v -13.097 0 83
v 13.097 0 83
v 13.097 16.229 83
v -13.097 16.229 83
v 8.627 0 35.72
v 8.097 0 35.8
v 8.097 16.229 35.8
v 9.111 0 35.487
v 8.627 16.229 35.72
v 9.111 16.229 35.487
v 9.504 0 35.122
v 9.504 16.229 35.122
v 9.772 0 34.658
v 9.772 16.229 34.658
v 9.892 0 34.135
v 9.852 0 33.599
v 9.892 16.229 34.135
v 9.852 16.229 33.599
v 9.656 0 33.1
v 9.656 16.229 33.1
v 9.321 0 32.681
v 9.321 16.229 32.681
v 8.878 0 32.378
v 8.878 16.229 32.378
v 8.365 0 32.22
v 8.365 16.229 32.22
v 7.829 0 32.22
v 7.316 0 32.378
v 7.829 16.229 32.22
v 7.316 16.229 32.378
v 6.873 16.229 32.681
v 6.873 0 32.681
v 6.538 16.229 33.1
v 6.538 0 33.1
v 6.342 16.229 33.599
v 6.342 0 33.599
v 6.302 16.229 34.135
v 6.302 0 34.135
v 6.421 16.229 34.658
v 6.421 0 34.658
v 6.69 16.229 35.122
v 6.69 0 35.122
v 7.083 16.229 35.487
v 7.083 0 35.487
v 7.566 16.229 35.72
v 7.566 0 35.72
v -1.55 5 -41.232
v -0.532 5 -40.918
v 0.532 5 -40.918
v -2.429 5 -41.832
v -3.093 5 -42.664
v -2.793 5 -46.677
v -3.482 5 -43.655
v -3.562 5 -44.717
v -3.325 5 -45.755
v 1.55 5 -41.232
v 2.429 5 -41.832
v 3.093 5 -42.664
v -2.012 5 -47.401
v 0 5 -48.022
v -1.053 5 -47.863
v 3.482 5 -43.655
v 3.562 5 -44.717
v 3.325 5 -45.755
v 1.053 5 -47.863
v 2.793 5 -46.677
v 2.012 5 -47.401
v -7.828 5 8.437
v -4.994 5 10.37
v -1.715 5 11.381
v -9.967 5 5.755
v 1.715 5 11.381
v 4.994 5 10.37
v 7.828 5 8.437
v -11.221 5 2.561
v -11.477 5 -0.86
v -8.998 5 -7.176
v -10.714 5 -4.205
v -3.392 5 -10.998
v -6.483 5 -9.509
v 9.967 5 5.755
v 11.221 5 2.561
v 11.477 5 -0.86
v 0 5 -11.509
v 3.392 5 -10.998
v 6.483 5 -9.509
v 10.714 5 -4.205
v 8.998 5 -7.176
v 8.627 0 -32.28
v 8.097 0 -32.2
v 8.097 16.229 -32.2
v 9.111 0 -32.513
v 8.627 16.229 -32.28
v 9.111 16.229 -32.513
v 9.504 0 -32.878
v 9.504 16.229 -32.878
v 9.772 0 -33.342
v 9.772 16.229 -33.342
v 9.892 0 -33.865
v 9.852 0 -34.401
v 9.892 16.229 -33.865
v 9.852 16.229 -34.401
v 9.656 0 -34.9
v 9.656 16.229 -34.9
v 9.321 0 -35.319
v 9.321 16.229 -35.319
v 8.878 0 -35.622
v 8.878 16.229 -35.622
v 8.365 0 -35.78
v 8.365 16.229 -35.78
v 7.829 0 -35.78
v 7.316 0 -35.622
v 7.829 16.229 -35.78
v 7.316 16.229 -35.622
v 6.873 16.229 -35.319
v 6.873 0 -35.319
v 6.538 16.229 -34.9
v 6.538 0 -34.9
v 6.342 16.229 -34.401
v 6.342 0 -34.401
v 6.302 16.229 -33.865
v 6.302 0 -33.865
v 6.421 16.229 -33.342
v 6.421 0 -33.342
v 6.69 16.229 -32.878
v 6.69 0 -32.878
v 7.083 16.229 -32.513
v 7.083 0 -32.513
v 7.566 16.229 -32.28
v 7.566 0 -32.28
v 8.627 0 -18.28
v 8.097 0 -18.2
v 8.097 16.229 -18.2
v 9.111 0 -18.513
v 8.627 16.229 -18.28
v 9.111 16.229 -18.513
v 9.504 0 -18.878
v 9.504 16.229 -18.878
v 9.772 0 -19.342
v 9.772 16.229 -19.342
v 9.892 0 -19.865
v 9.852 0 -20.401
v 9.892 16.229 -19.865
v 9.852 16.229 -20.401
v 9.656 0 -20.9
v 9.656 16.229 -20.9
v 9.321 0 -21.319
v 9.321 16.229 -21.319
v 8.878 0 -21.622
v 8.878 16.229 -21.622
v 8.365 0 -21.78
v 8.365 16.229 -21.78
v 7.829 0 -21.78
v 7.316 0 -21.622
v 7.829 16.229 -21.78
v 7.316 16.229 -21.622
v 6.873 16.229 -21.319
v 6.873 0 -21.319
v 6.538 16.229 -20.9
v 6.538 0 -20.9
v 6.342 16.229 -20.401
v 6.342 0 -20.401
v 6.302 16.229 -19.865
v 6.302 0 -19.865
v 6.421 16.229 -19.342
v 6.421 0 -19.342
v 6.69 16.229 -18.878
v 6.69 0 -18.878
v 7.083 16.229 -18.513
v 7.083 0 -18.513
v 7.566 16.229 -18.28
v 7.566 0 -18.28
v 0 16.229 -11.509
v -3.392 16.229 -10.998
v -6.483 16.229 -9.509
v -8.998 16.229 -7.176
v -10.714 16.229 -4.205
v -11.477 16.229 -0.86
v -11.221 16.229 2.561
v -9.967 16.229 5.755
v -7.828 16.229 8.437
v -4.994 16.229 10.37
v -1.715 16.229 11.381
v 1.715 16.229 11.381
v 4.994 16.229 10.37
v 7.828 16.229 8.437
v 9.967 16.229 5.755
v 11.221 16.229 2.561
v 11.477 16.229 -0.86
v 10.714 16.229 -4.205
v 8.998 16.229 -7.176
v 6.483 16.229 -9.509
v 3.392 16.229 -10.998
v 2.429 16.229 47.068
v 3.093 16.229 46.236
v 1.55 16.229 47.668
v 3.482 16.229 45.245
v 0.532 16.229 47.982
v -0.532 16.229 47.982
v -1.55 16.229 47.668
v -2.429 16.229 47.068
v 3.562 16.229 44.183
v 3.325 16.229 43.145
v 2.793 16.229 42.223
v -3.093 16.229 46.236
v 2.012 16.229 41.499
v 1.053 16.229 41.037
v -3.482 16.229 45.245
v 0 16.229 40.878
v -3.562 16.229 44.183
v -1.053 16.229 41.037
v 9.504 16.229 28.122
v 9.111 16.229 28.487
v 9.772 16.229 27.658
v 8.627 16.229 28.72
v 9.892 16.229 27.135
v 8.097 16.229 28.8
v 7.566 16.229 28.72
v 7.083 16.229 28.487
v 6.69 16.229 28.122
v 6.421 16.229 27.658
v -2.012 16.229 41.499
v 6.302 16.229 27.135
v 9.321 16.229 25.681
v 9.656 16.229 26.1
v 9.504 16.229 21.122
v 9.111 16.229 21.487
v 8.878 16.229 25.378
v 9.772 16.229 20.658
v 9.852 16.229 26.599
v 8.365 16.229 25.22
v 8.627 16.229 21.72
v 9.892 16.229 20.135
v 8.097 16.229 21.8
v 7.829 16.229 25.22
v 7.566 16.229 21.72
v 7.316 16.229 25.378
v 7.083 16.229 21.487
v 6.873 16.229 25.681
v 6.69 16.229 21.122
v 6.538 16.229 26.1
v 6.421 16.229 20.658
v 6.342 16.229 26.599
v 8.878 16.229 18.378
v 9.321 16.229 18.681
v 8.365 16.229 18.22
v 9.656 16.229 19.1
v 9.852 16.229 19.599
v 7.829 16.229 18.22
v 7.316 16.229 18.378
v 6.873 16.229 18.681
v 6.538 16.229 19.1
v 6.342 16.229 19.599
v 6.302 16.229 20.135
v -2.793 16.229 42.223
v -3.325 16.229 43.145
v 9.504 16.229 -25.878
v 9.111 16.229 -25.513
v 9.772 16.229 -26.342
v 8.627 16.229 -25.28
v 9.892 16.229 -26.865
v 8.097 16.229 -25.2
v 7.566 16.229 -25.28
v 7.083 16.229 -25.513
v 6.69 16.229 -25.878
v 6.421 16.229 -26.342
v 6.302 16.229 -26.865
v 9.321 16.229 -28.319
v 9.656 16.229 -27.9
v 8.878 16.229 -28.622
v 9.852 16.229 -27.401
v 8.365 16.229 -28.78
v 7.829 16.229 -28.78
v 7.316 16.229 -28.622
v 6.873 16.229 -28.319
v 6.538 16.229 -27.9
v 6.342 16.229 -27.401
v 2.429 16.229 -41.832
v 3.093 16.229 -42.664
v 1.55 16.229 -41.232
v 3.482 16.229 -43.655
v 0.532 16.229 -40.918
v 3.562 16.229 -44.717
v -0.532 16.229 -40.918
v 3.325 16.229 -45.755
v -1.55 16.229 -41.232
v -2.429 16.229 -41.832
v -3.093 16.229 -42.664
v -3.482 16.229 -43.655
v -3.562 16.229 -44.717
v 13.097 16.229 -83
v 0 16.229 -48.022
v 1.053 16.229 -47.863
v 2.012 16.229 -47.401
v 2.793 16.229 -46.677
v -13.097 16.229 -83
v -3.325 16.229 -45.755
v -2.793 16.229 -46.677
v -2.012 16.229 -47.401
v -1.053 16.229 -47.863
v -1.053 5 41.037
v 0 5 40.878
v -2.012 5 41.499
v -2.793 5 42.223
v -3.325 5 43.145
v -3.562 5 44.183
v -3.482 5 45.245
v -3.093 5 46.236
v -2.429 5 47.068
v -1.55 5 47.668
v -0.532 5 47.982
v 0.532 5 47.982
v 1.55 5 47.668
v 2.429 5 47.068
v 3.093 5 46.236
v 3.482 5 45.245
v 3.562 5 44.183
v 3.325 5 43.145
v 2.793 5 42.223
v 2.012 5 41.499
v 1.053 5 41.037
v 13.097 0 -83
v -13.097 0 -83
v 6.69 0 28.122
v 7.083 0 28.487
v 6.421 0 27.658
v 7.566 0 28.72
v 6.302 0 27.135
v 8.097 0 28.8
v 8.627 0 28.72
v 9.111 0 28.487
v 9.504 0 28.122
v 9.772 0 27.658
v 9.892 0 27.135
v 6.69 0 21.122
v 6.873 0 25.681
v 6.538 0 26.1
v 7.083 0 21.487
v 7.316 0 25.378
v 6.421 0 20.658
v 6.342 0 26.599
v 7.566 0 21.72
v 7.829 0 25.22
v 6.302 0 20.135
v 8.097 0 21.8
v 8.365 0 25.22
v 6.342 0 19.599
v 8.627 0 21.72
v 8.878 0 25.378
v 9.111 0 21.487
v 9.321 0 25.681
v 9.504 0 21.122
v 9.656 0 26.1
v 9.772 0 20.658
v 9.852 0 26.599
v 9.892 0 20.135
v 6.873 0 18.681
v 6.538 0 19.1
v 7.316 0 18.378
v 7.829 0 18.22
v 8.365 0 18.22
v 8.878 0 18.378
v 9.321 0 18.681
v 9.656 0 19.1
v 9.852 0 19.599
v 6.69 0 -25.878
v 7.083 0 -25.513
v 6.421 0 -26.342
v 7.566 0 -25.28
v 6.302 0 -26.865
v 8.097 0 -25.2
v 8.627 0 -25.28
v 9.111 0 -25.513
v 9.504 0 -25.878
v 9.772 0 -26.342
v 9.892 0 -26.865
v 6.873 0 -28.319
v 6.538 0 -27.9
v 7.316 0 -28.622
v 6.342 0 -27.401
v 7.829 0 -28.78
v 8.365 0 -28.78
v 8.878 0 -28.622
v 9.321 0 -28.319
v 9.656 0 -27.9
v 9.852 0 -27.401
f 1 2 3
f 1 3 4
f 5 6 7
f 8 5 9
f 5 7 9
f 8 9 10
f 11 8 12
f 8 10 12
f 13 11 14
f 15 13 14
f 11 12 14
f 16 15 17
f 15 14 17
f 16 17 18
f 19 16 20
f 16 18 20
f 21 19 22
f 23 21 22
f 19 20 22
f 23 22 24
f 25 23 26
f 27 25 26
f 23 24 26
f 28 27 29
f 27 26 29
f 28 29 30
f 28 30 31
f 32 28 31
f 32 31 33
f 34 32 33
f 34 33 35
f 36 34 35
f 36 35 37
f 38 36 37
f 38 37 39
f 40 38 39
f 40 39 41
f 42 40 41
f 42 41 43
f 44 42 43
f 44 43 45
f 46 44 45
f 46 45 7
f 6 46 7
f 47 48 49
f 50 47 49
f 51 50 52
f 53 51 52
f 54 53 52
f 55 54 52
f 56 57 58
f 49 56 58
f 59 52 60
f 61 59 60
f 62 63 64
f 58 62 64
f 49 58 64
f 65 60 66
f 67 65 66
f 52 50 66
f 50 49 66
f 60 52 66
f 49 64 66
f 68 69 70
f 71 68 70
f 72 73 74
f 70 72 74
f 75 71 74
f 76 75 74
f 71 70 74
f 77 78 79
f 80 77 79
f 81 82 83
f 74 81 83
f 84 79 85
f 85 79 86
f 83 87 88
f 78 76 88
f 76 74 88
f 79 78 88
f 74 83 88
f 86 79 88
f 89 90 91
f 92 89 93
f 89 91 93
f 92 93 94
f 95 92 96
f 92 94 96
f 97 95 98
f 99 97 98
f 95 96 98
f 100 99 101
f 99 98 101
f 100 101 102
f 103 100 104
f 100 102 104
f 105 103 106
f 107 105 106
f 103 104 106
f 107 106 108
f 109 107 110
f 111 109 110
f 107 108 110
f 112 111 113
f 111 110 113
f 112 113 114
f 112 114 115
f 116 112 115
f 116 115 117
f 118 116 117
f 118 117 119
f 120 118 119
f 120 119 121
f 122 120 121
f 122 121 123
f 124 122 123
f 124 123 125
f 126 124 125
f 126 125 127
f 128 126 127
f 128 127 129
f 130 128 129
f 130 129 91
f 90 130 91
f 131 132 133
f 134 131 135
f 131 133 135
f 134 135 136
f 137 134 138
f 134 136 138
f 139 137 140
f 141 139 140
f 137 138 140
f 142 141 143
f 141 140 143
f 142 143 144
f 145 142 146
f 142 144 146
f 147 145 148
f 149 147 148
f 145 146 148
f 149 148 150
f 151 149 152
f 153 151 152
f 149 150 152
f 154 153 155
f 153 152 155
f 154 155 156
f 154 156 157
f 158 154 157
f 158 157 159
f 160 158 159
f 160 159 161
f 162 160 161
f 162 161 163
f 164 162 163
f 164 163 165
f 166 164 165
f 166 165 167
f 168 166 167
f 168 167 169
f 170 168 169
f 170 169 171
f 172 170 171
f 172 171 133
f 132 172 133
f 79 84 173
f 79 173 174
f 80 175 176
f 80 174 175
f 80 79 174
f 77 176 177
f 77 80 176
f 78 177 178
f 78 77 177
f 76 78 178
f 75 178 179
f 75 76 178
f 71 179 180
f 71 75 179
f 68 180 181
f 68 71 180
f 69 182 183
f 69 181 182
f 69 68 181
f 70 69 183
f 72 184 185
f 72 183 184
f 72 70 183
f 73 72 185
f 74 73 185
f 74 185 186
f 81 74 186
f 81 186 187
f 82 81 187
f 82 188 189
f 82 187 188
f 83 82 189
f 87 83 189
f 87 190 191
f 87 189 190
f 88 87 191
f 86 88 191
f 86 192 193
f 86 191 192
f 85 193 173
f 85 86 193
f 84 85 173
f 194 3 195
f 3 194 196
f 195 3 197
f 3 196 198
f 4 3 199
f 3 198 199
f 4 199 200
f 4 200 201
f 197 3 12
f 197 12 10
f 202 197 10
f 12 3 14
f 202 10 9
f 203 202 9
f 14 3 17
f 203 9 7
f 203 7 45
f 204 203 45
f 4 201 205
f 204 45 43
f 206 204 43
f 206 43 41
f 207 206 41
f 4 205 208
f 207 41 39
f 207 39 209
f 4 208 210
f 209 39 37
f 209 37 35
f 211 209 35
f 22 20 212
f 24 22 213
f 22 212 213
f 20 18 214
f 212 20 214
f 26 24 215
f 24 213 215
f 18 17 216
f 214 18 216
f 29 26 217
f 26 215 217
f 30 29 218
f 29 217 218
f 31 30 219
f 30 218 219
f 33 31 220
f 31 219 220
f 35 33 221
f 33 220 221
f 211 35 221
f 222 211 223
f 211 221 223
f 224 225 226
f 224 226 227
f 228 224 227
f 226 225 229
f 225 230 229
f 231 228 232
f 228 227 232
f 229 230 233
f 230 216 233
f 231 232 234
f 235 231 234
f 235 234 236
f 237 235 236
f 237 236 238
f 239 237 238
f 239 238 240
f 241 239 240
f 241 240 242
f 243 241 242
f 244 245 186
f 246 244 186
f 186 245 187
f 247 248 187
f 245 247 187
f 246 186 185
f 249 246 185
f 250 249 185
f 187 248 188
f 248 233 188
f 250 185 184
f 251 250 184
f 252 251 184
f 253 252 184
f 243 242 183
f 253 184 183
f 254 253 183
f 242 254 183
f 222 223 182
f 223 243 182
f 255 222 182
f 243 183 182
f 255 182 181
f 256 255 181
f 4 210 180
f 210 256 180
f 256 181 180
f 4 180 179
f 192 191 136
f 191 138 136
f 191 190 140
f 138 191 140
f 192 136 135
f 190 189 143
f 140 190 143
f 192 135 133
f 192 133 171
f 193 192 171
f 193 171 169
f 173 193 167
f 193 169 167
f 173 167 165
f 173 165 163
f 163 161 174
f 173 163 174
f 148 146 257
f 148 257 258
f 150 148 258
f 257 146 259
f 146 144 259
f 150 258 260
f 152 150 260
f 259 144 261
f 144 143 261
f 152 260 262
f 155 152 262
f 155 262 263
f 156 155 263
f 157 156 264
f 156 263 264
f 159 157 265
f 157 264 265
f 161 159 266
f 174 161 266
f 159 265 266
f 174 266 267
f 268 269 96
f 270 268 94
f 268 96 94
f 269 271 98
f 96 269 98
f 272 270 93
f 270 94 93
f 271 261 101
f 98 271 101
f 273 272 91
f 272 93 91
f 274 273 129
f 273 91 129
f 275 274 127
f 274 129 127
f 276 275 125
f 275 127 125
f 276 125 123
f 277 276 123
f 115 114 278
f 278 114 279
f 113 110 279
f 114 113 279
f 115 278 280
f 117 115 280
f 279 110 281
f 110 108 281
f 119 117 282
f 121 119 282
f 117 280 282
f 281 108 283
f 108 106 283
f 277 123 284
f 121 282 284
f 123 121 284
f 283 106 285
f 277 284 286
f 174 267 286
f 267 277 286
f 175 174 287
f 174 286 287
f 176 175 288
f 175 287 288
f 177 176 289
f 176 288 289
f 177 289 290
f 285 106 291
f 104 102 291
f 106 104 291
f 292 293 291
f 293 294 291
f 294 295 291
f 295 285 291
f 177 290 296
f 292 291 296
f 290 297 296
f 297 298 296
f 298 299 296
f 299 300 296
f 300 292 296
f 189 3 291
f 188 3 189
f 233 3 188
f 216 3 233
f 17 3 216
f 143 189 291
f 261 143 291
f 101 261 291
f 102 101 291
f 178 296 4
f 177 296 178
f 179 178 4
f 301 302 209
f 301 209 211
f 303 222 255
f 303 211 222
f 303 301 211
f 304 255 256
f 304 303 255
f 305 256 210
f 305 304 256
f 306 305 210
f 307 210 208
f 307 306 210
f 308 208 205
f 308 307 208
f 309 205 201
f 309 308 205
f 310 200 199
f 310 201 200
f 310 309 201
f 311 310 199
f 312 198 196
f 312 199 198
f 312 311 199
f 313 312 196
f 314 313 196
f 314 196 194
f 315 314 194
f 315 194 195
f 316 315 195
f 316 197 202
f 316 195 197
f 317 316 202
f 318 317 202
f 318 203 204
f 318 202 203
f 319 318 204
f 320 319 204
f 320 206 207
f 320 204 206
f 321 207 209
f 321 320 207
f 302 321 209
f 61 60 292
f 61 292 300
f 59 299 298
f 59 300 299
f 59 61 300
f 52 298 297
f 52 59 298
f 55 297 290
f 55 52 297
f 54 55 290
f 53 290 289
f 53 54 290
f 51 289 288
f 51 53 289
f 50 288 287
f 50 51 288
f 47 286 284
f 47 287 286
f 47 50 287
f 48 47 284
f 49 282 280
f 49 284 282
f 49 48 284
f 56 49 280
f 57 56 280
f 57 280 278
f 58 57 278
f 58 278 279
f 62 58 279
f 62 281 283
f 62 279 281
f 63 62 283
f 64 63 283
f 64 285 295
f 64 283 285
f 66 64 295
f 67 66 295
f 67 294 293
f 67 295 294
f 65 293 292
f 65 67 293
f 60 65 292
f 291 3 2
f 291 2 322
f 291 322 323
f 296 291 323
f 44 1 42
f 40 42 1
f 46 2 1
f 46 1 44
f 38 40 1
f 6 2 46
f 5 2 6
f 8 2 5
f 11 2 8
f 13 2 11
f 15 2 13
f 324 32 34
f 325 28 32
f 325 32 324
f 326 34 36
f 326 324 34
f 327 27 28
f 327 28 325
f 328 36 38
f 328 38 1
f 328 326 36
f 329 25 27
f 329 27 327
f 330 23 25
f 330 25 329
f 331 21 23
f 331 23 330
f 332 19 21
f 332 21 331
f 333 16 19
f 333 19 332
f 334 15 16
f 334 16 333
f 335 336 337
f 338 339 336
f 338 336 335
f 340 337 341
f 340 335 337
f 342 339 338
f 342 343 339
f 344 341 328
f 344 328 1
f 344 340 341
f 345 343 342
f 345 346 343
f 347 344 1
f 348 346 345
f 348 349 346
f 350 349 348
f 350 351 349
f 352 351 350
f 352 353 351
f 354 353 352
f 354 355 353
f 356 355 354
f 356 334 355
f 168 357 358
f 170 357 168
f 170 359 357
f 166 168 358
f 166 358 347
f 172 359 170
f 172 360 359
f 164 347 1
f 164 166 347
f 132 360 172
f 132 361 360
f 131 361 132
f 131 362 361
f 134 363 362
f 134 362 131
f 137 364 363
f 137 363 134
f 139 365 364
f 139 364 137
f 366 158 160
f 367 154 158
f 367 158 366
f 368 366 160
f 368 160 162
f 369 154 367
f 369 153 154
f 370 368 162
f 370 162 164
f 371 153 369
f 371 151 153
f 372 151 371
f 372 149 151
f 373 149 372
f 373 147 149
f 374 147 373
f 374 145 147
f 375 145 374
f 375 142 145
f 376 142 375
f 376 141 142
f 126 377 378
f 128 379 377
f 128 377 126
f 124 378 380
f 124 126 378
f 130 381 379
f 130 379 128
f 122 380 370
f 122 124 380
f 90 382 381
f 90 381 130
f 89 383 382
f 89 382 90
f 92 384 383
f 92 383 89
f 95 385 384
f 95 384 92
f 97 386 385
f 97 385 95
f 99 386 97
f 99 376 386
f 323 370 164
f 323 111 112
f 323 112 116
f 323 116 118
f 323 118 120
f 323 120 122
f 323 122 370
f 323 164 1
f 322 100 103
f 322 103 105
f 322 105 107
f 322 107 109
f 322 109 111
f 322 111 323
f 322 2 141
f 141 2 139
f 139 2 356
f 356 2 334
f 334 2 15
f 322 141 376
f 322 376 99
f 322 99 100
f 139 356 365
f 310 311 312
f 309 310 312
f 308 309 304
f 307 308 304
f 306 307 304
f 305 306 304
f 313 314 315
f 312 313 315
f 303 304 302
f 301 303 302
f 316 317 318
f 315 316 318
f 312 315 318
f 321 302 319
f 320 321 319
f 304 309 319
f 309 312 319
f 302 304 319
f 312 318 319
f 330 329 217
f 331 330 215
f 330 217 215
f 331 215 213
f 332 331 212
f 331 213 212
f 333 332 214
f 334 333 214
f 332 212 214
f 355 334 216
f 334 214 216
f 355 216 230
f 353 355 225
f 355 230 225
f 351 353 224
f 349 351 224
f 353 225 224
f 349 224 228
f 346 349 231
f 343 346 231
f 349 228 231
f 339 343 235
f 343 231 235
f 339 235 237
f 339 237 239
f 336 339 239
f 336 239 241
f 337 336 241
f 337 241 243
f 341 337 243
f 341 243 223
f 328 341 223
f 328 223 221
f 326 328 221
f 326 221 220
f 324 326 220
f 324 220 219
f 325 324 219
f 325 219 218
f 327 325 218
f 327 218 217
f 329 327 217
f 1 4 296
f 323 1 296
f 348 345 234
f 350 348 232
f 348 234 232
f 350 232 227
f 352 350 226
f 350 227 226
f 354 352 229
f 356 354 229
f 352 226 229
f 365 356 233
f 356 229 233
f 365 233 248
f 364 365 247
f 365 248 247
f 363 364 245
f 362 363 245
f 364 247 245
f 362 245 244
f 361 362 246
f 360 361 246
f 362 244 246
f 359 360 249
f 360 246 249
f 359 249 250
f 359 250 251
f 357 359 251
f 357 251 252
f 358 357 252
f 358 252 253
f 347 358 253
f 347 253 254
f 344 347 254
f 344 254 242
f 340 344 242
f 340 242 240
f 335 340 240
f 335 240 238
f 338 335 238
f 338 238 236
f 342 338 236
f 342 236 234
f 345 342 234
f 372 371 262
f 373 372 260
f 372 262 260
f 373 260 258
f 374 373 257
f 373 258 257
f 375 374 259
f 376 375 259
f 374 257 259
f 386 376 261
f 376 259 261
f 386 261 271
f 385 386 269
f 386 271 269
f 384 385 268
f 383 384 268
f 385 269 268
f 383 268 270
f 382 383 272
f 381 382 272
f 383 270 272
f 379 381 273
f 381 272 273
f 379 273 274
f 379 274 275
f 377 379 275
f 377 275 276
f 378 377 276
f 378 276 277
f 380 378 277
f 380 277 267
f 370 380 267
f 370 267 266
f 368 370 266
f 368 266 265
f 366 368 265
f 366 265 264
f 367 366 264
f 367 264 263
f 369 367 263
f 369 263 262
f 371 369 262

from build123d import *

# Parameters (mm, degrees)
SKETCH1_W         = 38.1
SKETCH1_H         = 166
SKETCH1_R         = 11.509375
SKETCH1_R_2       = 3.571875
EXTRUSION1_DEPTH  = 25.4
EXTRUSION15_REACH = 171.009
SKETCH2_W         = 38.1
SKETCH2_H         = 9.170812283
EXTRUSION18_REACH = 90.865
SKETCH4_R         = 1.8
SKETCH4_W         = 5.953125
SKETCH4_H         = 166
SKETCH5_R         = 3.571875
SKETCH5_R_2       = 11.509375
EXTRUSION19_DEPTH = 5


with BuildPart() as part:
    # Sketch1 → Extrusion1 (new body)
    with BuildSketch(Plane(origin=(0, 0, 0), x_dir=(-1, 0, 0), z_dir=(0, 1, 0))):
        Rectangle(SKETCH1_W, SKETCH1_H)
        with Locations(Location((0, 0, 0), (0, 0, 270))):
            Circle(SKETCH1_R, mode=Mode.SUBTRACT)
        with Locations(Location((0, -44.45, 0), (0, 0, 270))):
            Circle(SKETCH1_R_2, mode=Mode.SUBTRACT)
        with Locations(Location((0, 44.45, 0), (0, 0, 270))):
            Circle(SKETCH1_R_2, mode=Mode.SUBTRACT)
    extrude(amount=EXTRUSION1_DEPTH)

    # Sketch2 → Extrusion15 (cut, up to next)
    with BuildSketch(Plane(origin=(0, 0, -83), x_dir=(-1, 0, 0), z_dir=(0, 0, -1)), mode=Mode.PRIVATE) as extrusion15_sk1:
        with Locations((0, 20.814593859)):
            Rectangle(SKETCH2_W, SKETCH2_H)
    extrusion15_tool1 = extrude(extrusion15_sk1.sketch, amount=-EXTRUSION15_REACH, mode=Mode.PRIVATE) & part.part
    add(extrusion15_tool1.solids().sort_by_distance((0, 20.814594, -83))[0], mode=Mode.SUBTRACT)

    # Sketch4 → Extrusion18 (cut, up to next)
    with BuildSketch(Plane(origin=(0, 25.4, 0), x_dir=(1, 0, 0), z_dir=(0, 1, 0)), mode=Mode.PRIVATE) as extrusion18_sk1:
        with Locations(Location((8.096875, -34, 0), (0, 0, 270))):
            Circle(SKETCH4_R)
    extrusion18_tool1 = extrude(extrusion18_sk1.sketch, amount=-EXTRUSION18_REACH, mode=Mode.PRIVATE) & part.part
    # Sketch4 → Extrusion18 (cut, up to next)
    with BuildSketch(Plane(origin=(0, 25.4, 0), x_dir=(1, 0, 0), z_dir=(0, 1, 0)), mode=Mode.PRIVATE) as extrusion18_sk2:
        with Locations(Location((8.096875, -27, 0), (0, 0, 270))):
            Circle(SKETCH4_R)
    extrusion18_tool2 = extrude(extrusion18_sk2.sketch, amount=-EXTRUSION18_REACH, mode=Mode.PRIVATE) & part.part
    # Sketch4 → Extrusion18 (cut, up to next)
    with BuildSketch(Plane(origin=(0, 25.4, 0), x_dir=(1, 0, 0), z_dir=(0, 1, 0)), mode=Mode.PRIVATE) as extrusion18_sk3:
        with Locations(Location((8.096875, -20, 0), (0, 0, 270))):
            Circle(SKETCH4_R)
    extrusion18_tool3 = extrude(extrusion18_sk3.sketch, amount=-EXTRUSION18_REACH, mode=Mode.PRIVATE) & part.part
    # Sketch4 → Extrusion18 (cut, up to next)
    with BuildSketch(Plane(origin=(0, 25.4, 0), x_dir=(1, 0, 0), z_dir=(0, 1, 0)), mode=Mode.PRIVATE) as extrusion18_sk4:
        with Locations(Location((8.096875, 20, 0), (0, 0, 270))):
            Circle(SKETCH4_R)
    extrusion18_tool4 = extrude(extrusion18_sk4.sketch, amount=-EXTRUSION18_REACH, mode=Mode.PRIVATE) & part.part
    # Sketch4 → Extrusion18 (cut, up to next)
    with BuildSketch(Plane(origin=(0, 25.4, 0), x_dir=(1, 0, 0), z_dir=(0, 1, 0)), mode=Mode.PRIVATE) as extrusion18_sk5:
        with Locations(Location((8.096875, 27, 0), (0, 0, 270))):
            Circle(SKETCH4_R)
    extrusion18_tool5 = extrude(extrusion18_sk5.sketch, amount=-EXTRUSION18_REACH, mode=Mode.PRIVATE) & part.part
    # Sketch4 → Extrusion18 (cut, up to next)
    with BuildSketch(Plane(origin=(0, 25.4, 0), x_dir=(1, 0, 0), z_dir=(0, 1, 0)), mode=Mode.PRIVATE) as extrusion18_sk6:
        with Locations(Location((8.096875, 34, 0), (0, 0, 270))):
            Circle(SKETCH4_R)
    extrusion18_tool6 = extrude(extrusion18_sk6.sketch, amount=-EXTRUSION18_REACH, mode=Mode.PRIVATE) & part.part
    # Sketch4 → Extrusion18 (cut, up to next)
    with BuildSketch(Plane(origin=(0, 25.4, 0), x_dir=(1, 0, 0), z_dir=(0, 1, 0)), mode=Mode.PRIVATE) as extrusion18_sk7:
        with Locations((-16.0734375, 0)):
            Rectangle(SKETCH4_W, SKETCH4_H)
    extrusion18_tool7 = extrude(extrusion18_sk7.sketch, amount=-EXTRUSION18_REACH, mode=Mode.PRIVATE) & part.part
    # Sketch4 → Extrusion18 (cut, up to next)
    with BuildSketch(Plane(origin=(0, 25.4, 0), x_dir=(1, 0, 0), z_dir=(0, 1, 0)), mode=Mode.PRIVATE) as extrusion18_sk8:
        with Locations((16.0734375, 0)):
            Rectangle(SKETCH4_W, SKETCH4_H)
    extrusion18_tool8 = extrude(extrusion18_sk8.sketch, amount=-EXTRUSION18_REACH, mode=Mode.PRIVATE) & part.part
    add(extrusion18_tool1.solids().sort_by_distance((8.096875, 25.4, 34))[0], mode=Mode.SUBTRACT)
    add(extrusion18_tool2.solids().sort_by_distance((8.096875, 25.4, 27))[0], mode=Mode.SUBTRACT)
    add(extrusion18_tool3.solids().sort_by_distance((8.096875, 25.4, 20))[0], mode=Mode.SUBTRACT)
    add(extrusion18_tool4.solids().sort_by_distance((8.096875, 25.4, -20))[0], mode=Mode.SUBTRACT)
    add(extrusion18_tool5.solids().sort_by_distance((8.096875, 25.4, -27))[0], mode=Mode.SUBTRACT)
    add(extrusion18_tool6.solids().sort_by_distance((8.096875, 25.4, -34))[0], mode=Mode.SUBTRACT)
    add(extrusion18_tool7.solids().sort_by_distance((-16.073437, 25.4, 0))[0], mode=Mode.SUBTRACT)
    add(extrusion18_tool8.solids().sort_by_distance((16.073438, 25.4, 0))[0], mode=Mode.SUBTRACT)

    # Sketch5 → Extrusion19 (add)
    with BuildSketch(Plane.XZ):
        with Locations(Location((0, 44.45, 0), (0, 0, 270))):
            Circle(SKETCH5_R)
        with Locations(Location((0, -44.45, 0), (0, 0, 270))):
            Circle(SKETCH5_R)
        with Locations(Location((0, 0, 0), (0, 0, 270))):
            Circle(SKETCH5_R_2)
    extrude(amount=-EXTRUSION19_DEPTH)


solid = part.part
